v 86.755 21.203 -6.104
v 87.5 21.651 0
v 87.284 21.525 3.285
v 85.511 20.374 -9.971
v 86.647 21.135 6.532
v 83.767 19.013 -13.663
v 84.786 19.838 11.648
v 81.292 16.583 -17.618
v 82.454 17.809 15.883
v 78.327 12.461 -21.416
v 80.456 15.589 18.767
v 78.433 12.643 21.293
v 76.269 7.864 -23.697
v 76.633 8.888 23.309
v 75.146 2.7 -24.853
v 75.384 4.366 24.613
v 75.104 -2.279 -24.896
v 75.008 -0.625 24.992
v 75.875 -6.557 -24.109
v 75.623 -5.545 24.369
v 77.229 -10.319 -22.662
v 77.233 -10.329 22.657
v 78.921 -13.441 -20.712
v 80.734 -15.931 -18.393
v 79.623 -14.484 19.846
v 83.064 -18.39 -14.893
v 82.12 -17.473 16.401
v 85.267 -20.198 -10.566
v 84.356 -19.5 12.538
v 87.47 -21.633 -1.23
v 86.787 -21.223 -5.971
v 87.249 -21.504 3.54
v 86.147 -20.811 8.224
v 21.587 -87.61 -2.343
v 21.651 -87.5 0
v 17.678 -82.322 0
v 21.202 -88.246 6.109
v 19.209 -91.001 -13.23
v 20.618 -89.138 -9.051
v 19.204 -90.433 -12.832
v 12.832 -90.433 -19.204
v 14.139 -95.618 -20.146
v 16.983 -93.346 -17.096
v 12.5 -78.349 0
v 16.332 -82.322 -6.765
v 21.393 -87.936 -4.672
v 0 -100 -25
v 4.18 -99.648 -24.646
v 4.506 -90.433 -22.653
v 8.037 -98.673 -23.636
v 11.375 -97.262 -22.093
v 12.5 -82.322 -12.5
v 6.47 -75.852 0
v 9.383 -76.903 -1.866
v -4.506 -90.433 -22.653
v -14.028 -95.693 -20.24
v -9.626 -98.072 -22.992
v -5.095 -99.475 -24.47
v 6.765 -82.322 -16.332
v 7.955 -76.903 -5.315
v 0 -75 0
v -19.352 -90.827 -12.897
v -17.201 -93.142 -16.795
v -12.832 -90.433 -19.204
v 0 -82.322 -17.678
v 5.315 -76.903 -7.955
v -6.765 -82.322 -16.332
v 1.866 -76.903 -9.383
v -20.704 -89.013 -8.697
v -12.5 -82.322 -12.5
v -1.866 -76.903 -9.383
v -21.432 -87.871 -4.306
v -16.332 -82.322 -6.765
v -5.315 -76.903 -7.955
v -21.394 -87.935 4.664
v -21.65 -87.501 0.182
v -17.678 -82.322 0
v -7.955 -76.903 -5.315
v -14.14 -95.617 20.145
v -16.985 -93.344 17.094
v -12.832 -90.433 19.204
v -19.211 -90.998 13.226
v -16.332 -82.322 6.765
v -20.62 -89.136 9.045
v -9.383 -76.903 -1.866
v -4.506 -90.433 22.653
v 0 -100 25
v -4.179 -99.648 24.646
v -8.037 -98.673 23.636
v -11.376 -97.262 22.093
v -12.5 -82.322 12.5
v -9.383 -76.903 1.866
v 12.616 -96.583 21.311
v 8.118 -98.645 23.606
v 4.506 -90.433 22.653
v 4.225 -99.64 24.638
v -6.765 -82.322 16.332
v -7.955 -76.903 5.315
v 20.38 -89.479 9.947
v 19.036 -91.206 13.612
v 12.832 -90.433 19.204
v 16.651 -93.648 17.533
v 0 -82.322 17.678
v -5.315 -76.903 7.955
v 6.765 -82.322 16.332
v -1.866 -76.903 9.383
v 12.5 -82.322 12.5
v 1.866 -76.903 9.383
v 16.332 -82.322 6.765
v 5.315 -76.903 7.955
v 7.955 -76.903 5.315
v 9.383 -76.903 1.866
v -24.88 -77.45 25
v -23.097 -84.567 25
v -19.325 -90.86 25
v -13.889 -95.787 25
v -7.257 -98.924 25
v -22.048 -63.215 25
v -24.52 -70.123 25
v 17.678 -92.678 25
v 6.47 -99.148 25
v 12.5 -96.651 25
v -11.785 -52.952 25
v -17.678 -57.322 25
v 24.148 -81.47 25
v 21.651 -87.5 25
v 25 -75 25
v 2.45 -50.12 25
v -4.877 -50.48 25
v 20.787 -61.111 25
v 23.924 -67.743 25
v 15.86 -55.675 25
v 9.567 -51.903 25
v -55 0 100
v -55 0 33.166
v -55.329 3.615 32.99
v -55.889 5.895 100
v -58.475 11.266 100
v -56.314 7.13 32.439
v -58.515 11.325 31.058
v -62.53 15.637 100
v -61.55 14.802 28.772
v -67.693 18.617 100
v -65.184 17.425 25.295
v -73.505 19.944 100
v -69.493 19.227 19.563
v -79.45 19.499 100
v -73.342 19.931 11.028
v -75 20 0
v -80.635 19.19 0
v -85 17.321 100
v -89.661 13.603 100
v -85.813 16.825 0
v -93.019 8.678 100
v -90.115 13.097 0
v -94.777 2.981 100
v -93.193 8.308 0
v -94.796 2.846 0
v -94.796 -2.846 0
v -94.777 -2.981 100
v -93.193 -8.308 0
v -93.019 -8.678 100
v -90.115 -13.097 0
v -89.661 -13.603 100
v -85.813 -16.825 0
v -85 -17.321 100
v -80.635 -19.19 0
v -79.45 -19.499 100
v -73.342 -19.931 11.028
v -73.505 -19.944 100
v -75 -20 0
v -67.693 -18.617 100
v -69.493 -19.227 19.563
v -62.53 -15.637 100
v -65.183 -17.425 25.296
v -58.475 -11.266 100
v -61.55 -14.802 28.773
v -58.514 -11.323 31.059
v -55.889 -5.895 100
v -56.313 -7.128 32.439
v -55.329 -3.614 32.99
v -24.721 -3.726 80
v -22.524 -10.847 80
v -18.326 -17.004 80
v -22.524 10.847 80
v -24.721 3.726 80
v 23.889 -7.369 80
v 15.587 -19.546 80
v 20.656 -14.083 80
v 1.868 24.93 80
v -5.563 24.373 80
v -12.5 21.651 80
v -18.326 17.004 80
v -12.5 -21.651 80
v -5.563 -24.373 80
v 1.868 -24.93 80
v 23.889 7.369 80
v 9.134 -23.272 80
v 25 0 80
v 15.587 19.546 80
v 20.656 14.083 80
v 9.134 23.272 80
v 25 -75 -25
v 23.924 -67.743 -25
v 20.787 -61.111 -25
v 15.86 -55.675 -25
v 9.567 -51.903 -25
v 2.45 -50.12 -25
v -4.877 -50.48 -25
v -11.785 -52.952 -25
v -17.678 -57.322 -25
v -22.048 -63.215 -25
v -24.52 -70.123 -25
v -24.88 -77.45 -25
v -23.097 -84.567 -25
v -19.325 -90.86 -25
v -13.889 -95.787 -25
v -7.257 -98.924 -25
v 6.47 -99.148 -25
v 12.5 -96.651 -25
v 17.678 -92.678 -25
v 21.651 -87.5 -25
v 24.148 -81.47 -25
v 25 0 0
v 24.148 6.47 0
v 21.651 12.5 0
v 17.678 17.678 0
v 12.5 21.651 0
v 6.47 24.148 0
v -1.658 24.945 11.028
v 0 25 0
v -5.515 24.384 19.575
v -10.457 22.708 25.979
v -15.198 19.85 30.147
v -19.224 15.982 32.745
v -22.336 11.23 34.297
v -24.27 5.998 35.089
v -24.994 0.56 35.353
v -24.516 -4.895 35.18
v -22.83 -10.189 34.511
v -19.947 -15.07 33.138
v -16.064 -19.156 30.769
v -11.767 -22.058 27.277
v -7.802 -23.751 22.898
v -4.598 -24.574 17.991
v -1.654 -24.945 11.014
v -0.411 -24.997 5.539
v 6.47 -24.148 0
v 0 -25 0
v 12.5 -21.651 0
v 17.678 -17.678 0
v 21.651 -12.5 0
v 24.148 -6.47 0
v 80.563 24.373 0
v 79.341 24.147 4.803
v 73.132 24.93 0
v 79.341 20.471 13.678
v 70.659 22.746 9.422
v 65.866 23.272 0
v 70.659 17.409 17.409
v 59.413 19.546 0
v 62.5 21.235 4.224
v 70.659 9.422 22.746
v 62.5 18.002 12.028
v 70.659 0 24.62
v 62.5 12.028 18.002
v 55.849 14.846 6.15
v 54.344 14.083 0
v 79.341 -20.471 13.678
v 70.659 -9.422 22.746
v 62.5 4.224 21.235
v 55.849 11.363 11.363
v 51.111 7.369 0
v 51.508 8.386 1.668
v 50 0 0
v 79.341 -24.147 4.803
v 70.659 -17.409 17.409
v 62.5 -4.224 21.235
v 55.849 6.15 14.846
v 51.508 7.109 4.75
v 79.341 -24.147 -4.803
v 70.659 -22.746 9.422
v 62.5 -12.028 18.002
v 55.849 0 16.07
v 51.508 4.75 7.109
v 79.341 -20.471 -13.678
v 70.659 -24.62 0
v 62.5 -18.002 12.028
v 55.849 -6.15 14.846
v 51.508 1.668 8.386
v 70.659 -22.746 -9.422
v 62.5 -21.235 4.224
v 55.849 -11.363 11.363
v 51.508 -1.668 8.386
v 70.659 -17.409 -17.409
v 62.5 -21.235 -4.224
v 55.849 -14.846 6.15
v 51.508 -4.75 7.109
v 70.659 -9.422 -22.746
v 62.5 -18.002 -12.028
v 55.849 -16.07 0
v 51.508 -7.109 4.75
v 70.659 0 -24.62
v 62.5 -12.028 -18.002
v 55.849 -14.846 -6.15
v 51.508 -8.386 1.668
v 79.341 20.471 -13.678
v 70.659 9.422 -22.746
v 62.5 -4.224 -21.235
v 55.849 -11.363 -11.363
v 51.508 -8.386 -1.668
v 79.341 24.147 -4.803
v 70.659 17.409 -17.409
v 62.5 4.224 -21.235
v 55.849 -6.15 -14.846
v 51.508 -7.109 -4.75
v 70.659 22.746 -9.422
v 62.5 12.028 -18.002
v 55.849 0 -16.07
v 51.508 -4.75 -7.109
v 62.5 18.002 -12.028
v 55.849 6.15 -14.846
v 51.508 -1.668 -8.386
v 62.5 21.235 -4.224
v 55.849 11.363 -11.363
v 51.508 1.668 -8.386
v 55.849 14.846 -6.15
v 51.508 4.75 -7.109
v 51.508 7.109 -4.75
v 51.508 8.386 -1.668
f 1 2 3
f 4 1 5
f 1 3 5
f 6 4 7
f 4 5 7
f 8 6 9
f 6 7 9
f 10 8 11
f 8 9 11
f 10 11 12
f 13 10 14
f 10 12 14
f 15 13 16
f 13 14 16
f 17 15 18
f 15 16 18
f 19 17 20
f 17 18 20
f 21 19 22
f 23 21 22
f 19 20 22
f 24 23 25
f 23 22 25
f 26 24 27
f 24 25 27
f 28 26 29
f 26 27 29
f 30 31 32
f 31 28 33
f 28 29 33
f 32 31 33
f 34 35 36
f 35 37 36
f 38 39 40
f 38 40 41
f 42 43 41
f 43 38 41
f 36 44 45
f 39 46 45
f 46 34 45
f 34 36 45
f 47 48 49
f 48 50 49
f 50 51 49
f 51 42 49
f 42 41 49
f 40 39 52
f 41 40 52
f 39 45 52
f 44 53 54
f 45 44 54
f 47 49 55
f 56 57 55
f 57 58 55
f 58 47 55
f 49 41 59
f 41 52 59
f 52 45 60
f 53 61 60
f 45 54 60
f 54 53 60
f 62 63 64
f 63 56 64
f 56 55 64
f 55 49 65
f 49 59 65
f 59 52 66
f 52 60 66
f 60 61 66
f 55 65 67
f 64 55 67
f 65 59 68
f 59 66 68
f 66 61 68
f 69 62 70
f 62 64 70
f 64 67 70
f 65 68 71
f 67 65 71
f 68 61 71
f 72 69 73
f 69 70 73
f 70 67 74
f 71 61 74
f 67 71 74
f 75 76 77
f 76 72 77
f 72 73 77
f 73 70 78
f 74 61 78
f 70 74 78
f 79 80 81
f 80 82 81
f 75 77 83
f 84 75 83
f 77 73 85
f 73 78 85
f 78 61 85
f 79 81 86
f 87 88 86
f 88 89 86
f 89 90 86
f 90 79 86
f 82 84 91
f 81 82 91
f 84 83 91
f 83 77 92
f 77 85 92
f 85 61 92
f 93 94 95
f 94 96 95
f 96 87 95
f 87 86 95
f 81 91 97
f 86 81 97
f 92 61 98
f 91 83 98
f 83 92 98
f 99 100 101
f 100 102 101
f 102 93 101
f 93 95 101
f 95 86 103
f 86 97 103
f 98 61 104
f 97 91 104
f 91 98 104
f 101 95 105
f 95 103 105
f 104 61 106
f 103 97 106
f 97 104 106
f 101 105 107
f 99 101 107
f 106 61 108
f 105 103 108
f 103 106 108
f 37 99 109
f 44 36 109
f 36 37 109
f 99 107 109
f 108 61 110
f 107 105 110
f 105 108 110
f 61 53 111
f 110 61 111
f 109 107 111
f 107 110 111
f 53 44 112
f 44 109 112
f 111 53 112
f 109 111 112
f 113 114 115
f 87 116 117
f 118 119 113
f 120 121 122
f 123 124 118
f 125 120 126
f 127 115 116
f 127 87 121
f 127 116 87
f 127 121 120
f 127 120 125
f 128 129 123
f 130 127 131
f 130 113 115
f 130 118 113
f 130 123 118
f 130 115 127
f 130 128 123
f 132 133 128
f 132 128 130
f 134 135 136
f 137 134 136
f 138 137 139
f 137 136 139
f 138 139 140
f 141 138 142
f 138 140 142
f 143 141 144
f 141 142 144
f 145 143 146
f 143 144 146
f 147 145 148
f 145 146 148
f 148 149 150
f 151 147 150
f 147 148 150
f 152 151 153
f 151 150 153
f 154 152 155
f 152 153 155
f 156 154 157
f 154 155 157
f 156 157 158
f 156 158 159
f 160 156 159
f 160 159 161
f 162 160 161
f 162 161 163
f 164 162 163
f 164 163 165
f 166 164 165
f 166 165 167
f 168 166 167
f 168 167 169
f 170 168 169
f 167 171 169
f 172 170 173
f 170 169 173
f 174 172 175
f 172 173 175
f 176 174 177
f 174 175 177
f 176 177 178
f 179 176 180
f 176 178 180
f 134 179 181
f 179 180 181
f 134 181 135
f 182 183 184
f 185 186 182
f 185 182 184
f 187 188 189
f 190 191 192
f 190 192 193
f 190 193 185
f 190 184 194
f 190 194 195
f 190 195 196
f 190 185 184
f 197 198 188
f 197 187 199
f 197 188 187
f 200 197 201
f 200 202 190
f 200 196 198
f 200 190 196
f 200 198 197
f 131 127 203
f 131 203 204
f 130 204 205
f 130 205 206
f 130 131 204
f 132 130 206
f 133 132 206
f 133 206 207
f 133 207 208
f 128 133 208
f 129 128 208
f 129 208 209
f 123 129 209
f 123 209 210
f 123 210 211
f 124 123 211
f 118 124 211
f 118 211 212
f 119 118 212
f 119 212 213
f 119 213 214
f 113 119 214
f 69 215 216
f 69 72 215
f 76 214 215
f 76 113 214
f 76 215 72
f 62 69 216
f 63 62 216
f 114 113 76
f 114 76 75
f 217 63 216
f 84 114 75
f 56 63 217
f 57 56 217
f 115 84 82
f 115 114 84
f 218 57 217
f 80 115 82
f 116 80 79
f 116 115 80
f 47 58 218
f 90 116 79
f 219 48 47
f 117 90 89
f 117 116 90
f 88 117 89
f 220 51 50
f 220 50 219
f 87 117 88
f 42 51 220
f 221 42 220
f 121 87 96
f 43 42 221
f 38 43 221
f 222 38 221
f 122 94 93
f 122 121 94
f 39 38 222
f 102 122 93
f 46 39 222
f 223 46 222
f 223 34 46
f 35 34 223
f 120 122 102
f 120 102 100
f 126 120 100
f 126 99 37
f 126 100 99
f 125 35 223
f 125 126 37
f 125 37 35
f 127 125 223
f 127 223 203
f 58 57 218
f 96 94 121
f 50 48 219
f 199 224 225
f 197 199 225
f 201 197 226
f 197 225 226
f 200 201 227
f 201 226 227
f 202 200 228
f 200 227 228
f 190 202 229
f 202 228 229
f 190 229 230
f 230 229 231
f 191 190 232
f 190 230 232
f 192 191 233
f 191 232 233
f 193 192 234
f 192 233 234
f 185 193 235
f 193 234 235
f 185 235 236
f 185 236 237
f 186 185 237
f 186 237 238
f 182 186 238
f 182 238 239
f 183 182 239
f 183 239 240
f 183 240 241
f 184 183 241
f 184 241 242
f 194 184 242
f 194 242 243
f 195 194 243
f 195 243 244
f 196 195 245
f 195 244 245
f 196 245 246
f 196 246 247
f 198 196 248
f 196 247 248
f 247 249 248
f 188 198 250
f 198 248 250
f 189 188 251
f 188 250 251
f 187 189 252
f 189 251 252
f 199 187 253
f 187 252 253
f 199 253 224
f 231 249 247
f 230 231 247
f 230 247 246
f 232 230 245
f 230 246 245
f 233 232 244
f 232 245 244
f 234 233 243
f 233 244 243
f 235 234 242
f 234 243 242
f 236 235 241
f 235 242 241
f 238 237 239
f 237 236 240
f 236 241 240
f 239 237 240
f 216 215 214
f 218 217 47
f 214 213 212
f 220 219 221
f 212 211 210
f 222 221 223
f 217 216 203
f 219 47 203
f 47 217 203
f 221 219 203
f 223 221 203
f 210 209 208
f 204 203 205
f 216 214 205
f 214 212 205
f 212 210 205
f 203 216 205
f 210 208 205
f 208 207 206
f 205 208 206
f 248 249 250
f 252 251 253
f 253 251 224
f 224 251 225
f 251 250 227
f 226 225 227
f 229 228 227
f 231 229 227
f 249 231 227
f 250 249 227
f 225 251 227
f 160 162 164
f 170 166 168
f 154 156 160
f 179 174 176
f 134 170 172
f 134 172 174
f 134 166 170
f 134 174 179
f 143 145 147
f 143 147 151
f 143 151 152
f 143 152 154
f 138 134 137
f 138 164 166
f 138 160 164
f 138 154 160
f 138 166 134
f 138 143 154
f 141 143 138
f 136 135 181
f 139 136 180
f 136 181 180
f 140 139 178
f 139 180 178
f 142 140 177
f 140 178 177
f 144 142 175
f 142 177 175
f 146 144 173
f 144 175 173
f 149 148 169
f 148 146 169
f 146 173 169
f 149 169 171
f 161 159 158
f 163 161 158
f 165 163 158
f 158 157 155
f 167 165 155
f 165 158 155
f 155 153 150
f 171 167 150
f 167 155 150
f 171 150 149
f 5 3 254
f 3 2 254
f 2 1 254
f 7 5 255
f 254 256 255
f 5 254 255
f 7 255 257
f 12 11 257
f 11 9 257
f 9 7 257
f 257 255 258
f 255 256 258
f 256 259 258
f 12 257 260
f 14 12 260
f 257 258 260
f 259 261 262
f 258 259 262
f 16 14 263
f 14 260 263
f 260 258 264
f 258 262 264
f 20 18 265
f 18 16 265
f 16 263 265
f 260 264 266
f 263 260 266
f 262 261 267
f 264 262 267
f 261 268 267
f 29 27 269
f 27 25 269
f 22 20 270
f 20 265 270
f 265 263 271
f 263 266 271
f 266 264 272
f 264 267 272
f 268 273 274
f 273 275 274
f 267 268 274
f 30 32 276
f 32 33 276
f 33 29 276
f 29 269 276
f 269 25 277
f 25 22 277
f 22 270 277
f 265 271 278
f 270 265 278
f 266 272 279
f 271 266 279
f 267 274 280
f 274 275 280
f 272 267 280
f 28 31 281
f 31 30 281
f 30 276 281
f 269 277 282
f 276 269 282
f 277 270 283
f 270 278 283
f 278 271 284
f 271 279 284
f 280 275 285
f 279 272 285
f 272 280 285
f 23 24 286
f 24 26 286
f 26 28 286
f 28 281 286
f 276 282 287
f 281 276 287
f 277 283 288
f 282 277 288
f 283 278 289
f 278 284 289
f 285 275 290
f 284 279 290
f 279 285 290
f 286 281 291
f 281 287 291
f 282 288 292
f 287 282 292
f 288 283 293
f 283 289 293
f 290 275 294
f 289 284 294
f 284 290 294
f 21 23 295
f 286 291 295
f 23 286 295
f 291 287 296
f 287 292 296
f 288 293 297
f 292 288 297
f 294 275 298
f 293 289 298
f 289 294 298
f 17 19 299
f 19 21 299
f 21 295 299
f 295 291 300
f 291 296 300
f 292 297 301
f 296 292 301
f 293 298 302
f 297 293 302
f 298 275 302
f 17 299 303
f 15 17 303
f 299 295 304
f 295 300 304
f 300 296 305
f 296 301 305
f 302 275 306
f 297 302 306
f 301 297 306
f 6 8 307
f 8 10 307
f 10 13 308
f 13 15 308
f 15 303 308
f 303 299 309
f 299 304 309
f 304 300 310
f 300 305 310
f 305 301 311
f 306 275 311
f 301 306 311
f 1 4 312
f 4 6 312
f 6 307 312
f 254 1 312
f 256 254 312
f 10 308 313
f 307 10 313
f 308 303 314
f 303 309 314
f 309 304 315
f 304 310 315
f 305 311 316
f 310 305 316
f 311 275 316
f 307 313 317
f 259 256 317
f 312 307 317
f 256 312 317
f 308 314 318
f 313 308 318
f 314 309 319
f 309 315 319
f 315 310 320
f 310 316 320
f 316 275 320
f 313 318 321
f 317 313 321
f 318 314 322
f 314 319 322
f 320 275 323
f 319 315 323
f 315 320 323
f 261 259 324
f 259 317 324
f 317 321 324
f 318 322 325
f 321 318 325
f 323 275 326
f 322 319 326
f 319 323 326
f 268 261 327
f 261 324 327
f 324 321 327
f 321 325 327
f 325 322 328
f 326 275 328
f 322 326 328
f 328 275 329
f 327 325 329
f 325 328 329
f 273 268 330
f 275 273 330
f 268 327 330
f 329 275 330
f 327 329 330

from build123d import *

# Parameters (mm, degrees)
F0_R      = 25
F1_DEPTH  = 80
F2_R      = 20
F3_DEPTH  = 100
F4_R      = 37.5
F5_DEPTH  = 30
F8_R      = 25
F9_DEPTH  = 50
F10_R     = 25
F11_DEPTH = 25


with BuildPart() as f1:
    # F0 (on Top) → F1 (new body)
    with BuildSketch(Plane.XY):
        Circle(F0_R)
    extrude(amount=F1_DEPTH)


with BuildPart() as f3:
    # F2 (on Top) → F3 (new body)
    with BuildSketch(Plane.XY):
        with Locations((-75, 0)):
            Circle(F2_R)
    extrude(amount=F3_DEPTH)


with BuildPart() as f5_tool:
    # F4 (on Front) → F5 (new body, symmetric)
    with BuildSketch(Plane.XZ):
        with Locations((-37.5, 0)):
            Circle(F4_R)
    extrude(amount=F5_DEPTH, both=True)


with BuildPart() as f1_1:
    add(f1.part)

    # F5: cut by f5_tool
    add(f5_tool.part, mode=Mode.SUBTRACT)


with BuildPart() as f3_1:
    add(f3.part)

    # F5: cut by f5_tool
    add(f5_tool.part, mode=Mode.SUBTRACT)


with BuildPart() as f7:
    # F6 (on Top) → F7 (revolve)
    with BuildSketch(Plane.XY):
        with BuildLine():
            Line((50, 0), (100, 0))
            ThreePointArc((100, 0), (75, 25), (50, 0))
        make_face()
    revolve(axis=Axis((75, 0, 0), (1, 0, 0)))

    # F8 (on Top) → F9 (cut, symmetric)
    with BuildSketch(Plane.XY):
        with Locations((100, 0)):
            Circle(F8_R)
    extrude(amount=F9_DEPTH, both=True, mode=Mode.SUBTRACT)


with BuildPart() as f11:
    # F10 (on Top) → F11 (new body, symmetric)
    with BuildSketch(Plane.XY):
        with Locations((0, -75)):
            Circle(F10_R)
    extrude(amount=F11_DEPTH, both=True)

    # F12 (on Top) → F13 (revolve, cut)
    with BuildSketch(Plane.XY):
        with BuildLine():
            Line((0, -75), (0, -125))
            ThreePointArc((0, -125), (25, -100), (0, -75))
        make_face()
    revolve(axis=Axis((0, -100, 0), (0, 1, 0)), mode=Mode.SUBTRACT)


solid = Compound([f1_1.part, f3_1.part, f7.part, f11.part])
